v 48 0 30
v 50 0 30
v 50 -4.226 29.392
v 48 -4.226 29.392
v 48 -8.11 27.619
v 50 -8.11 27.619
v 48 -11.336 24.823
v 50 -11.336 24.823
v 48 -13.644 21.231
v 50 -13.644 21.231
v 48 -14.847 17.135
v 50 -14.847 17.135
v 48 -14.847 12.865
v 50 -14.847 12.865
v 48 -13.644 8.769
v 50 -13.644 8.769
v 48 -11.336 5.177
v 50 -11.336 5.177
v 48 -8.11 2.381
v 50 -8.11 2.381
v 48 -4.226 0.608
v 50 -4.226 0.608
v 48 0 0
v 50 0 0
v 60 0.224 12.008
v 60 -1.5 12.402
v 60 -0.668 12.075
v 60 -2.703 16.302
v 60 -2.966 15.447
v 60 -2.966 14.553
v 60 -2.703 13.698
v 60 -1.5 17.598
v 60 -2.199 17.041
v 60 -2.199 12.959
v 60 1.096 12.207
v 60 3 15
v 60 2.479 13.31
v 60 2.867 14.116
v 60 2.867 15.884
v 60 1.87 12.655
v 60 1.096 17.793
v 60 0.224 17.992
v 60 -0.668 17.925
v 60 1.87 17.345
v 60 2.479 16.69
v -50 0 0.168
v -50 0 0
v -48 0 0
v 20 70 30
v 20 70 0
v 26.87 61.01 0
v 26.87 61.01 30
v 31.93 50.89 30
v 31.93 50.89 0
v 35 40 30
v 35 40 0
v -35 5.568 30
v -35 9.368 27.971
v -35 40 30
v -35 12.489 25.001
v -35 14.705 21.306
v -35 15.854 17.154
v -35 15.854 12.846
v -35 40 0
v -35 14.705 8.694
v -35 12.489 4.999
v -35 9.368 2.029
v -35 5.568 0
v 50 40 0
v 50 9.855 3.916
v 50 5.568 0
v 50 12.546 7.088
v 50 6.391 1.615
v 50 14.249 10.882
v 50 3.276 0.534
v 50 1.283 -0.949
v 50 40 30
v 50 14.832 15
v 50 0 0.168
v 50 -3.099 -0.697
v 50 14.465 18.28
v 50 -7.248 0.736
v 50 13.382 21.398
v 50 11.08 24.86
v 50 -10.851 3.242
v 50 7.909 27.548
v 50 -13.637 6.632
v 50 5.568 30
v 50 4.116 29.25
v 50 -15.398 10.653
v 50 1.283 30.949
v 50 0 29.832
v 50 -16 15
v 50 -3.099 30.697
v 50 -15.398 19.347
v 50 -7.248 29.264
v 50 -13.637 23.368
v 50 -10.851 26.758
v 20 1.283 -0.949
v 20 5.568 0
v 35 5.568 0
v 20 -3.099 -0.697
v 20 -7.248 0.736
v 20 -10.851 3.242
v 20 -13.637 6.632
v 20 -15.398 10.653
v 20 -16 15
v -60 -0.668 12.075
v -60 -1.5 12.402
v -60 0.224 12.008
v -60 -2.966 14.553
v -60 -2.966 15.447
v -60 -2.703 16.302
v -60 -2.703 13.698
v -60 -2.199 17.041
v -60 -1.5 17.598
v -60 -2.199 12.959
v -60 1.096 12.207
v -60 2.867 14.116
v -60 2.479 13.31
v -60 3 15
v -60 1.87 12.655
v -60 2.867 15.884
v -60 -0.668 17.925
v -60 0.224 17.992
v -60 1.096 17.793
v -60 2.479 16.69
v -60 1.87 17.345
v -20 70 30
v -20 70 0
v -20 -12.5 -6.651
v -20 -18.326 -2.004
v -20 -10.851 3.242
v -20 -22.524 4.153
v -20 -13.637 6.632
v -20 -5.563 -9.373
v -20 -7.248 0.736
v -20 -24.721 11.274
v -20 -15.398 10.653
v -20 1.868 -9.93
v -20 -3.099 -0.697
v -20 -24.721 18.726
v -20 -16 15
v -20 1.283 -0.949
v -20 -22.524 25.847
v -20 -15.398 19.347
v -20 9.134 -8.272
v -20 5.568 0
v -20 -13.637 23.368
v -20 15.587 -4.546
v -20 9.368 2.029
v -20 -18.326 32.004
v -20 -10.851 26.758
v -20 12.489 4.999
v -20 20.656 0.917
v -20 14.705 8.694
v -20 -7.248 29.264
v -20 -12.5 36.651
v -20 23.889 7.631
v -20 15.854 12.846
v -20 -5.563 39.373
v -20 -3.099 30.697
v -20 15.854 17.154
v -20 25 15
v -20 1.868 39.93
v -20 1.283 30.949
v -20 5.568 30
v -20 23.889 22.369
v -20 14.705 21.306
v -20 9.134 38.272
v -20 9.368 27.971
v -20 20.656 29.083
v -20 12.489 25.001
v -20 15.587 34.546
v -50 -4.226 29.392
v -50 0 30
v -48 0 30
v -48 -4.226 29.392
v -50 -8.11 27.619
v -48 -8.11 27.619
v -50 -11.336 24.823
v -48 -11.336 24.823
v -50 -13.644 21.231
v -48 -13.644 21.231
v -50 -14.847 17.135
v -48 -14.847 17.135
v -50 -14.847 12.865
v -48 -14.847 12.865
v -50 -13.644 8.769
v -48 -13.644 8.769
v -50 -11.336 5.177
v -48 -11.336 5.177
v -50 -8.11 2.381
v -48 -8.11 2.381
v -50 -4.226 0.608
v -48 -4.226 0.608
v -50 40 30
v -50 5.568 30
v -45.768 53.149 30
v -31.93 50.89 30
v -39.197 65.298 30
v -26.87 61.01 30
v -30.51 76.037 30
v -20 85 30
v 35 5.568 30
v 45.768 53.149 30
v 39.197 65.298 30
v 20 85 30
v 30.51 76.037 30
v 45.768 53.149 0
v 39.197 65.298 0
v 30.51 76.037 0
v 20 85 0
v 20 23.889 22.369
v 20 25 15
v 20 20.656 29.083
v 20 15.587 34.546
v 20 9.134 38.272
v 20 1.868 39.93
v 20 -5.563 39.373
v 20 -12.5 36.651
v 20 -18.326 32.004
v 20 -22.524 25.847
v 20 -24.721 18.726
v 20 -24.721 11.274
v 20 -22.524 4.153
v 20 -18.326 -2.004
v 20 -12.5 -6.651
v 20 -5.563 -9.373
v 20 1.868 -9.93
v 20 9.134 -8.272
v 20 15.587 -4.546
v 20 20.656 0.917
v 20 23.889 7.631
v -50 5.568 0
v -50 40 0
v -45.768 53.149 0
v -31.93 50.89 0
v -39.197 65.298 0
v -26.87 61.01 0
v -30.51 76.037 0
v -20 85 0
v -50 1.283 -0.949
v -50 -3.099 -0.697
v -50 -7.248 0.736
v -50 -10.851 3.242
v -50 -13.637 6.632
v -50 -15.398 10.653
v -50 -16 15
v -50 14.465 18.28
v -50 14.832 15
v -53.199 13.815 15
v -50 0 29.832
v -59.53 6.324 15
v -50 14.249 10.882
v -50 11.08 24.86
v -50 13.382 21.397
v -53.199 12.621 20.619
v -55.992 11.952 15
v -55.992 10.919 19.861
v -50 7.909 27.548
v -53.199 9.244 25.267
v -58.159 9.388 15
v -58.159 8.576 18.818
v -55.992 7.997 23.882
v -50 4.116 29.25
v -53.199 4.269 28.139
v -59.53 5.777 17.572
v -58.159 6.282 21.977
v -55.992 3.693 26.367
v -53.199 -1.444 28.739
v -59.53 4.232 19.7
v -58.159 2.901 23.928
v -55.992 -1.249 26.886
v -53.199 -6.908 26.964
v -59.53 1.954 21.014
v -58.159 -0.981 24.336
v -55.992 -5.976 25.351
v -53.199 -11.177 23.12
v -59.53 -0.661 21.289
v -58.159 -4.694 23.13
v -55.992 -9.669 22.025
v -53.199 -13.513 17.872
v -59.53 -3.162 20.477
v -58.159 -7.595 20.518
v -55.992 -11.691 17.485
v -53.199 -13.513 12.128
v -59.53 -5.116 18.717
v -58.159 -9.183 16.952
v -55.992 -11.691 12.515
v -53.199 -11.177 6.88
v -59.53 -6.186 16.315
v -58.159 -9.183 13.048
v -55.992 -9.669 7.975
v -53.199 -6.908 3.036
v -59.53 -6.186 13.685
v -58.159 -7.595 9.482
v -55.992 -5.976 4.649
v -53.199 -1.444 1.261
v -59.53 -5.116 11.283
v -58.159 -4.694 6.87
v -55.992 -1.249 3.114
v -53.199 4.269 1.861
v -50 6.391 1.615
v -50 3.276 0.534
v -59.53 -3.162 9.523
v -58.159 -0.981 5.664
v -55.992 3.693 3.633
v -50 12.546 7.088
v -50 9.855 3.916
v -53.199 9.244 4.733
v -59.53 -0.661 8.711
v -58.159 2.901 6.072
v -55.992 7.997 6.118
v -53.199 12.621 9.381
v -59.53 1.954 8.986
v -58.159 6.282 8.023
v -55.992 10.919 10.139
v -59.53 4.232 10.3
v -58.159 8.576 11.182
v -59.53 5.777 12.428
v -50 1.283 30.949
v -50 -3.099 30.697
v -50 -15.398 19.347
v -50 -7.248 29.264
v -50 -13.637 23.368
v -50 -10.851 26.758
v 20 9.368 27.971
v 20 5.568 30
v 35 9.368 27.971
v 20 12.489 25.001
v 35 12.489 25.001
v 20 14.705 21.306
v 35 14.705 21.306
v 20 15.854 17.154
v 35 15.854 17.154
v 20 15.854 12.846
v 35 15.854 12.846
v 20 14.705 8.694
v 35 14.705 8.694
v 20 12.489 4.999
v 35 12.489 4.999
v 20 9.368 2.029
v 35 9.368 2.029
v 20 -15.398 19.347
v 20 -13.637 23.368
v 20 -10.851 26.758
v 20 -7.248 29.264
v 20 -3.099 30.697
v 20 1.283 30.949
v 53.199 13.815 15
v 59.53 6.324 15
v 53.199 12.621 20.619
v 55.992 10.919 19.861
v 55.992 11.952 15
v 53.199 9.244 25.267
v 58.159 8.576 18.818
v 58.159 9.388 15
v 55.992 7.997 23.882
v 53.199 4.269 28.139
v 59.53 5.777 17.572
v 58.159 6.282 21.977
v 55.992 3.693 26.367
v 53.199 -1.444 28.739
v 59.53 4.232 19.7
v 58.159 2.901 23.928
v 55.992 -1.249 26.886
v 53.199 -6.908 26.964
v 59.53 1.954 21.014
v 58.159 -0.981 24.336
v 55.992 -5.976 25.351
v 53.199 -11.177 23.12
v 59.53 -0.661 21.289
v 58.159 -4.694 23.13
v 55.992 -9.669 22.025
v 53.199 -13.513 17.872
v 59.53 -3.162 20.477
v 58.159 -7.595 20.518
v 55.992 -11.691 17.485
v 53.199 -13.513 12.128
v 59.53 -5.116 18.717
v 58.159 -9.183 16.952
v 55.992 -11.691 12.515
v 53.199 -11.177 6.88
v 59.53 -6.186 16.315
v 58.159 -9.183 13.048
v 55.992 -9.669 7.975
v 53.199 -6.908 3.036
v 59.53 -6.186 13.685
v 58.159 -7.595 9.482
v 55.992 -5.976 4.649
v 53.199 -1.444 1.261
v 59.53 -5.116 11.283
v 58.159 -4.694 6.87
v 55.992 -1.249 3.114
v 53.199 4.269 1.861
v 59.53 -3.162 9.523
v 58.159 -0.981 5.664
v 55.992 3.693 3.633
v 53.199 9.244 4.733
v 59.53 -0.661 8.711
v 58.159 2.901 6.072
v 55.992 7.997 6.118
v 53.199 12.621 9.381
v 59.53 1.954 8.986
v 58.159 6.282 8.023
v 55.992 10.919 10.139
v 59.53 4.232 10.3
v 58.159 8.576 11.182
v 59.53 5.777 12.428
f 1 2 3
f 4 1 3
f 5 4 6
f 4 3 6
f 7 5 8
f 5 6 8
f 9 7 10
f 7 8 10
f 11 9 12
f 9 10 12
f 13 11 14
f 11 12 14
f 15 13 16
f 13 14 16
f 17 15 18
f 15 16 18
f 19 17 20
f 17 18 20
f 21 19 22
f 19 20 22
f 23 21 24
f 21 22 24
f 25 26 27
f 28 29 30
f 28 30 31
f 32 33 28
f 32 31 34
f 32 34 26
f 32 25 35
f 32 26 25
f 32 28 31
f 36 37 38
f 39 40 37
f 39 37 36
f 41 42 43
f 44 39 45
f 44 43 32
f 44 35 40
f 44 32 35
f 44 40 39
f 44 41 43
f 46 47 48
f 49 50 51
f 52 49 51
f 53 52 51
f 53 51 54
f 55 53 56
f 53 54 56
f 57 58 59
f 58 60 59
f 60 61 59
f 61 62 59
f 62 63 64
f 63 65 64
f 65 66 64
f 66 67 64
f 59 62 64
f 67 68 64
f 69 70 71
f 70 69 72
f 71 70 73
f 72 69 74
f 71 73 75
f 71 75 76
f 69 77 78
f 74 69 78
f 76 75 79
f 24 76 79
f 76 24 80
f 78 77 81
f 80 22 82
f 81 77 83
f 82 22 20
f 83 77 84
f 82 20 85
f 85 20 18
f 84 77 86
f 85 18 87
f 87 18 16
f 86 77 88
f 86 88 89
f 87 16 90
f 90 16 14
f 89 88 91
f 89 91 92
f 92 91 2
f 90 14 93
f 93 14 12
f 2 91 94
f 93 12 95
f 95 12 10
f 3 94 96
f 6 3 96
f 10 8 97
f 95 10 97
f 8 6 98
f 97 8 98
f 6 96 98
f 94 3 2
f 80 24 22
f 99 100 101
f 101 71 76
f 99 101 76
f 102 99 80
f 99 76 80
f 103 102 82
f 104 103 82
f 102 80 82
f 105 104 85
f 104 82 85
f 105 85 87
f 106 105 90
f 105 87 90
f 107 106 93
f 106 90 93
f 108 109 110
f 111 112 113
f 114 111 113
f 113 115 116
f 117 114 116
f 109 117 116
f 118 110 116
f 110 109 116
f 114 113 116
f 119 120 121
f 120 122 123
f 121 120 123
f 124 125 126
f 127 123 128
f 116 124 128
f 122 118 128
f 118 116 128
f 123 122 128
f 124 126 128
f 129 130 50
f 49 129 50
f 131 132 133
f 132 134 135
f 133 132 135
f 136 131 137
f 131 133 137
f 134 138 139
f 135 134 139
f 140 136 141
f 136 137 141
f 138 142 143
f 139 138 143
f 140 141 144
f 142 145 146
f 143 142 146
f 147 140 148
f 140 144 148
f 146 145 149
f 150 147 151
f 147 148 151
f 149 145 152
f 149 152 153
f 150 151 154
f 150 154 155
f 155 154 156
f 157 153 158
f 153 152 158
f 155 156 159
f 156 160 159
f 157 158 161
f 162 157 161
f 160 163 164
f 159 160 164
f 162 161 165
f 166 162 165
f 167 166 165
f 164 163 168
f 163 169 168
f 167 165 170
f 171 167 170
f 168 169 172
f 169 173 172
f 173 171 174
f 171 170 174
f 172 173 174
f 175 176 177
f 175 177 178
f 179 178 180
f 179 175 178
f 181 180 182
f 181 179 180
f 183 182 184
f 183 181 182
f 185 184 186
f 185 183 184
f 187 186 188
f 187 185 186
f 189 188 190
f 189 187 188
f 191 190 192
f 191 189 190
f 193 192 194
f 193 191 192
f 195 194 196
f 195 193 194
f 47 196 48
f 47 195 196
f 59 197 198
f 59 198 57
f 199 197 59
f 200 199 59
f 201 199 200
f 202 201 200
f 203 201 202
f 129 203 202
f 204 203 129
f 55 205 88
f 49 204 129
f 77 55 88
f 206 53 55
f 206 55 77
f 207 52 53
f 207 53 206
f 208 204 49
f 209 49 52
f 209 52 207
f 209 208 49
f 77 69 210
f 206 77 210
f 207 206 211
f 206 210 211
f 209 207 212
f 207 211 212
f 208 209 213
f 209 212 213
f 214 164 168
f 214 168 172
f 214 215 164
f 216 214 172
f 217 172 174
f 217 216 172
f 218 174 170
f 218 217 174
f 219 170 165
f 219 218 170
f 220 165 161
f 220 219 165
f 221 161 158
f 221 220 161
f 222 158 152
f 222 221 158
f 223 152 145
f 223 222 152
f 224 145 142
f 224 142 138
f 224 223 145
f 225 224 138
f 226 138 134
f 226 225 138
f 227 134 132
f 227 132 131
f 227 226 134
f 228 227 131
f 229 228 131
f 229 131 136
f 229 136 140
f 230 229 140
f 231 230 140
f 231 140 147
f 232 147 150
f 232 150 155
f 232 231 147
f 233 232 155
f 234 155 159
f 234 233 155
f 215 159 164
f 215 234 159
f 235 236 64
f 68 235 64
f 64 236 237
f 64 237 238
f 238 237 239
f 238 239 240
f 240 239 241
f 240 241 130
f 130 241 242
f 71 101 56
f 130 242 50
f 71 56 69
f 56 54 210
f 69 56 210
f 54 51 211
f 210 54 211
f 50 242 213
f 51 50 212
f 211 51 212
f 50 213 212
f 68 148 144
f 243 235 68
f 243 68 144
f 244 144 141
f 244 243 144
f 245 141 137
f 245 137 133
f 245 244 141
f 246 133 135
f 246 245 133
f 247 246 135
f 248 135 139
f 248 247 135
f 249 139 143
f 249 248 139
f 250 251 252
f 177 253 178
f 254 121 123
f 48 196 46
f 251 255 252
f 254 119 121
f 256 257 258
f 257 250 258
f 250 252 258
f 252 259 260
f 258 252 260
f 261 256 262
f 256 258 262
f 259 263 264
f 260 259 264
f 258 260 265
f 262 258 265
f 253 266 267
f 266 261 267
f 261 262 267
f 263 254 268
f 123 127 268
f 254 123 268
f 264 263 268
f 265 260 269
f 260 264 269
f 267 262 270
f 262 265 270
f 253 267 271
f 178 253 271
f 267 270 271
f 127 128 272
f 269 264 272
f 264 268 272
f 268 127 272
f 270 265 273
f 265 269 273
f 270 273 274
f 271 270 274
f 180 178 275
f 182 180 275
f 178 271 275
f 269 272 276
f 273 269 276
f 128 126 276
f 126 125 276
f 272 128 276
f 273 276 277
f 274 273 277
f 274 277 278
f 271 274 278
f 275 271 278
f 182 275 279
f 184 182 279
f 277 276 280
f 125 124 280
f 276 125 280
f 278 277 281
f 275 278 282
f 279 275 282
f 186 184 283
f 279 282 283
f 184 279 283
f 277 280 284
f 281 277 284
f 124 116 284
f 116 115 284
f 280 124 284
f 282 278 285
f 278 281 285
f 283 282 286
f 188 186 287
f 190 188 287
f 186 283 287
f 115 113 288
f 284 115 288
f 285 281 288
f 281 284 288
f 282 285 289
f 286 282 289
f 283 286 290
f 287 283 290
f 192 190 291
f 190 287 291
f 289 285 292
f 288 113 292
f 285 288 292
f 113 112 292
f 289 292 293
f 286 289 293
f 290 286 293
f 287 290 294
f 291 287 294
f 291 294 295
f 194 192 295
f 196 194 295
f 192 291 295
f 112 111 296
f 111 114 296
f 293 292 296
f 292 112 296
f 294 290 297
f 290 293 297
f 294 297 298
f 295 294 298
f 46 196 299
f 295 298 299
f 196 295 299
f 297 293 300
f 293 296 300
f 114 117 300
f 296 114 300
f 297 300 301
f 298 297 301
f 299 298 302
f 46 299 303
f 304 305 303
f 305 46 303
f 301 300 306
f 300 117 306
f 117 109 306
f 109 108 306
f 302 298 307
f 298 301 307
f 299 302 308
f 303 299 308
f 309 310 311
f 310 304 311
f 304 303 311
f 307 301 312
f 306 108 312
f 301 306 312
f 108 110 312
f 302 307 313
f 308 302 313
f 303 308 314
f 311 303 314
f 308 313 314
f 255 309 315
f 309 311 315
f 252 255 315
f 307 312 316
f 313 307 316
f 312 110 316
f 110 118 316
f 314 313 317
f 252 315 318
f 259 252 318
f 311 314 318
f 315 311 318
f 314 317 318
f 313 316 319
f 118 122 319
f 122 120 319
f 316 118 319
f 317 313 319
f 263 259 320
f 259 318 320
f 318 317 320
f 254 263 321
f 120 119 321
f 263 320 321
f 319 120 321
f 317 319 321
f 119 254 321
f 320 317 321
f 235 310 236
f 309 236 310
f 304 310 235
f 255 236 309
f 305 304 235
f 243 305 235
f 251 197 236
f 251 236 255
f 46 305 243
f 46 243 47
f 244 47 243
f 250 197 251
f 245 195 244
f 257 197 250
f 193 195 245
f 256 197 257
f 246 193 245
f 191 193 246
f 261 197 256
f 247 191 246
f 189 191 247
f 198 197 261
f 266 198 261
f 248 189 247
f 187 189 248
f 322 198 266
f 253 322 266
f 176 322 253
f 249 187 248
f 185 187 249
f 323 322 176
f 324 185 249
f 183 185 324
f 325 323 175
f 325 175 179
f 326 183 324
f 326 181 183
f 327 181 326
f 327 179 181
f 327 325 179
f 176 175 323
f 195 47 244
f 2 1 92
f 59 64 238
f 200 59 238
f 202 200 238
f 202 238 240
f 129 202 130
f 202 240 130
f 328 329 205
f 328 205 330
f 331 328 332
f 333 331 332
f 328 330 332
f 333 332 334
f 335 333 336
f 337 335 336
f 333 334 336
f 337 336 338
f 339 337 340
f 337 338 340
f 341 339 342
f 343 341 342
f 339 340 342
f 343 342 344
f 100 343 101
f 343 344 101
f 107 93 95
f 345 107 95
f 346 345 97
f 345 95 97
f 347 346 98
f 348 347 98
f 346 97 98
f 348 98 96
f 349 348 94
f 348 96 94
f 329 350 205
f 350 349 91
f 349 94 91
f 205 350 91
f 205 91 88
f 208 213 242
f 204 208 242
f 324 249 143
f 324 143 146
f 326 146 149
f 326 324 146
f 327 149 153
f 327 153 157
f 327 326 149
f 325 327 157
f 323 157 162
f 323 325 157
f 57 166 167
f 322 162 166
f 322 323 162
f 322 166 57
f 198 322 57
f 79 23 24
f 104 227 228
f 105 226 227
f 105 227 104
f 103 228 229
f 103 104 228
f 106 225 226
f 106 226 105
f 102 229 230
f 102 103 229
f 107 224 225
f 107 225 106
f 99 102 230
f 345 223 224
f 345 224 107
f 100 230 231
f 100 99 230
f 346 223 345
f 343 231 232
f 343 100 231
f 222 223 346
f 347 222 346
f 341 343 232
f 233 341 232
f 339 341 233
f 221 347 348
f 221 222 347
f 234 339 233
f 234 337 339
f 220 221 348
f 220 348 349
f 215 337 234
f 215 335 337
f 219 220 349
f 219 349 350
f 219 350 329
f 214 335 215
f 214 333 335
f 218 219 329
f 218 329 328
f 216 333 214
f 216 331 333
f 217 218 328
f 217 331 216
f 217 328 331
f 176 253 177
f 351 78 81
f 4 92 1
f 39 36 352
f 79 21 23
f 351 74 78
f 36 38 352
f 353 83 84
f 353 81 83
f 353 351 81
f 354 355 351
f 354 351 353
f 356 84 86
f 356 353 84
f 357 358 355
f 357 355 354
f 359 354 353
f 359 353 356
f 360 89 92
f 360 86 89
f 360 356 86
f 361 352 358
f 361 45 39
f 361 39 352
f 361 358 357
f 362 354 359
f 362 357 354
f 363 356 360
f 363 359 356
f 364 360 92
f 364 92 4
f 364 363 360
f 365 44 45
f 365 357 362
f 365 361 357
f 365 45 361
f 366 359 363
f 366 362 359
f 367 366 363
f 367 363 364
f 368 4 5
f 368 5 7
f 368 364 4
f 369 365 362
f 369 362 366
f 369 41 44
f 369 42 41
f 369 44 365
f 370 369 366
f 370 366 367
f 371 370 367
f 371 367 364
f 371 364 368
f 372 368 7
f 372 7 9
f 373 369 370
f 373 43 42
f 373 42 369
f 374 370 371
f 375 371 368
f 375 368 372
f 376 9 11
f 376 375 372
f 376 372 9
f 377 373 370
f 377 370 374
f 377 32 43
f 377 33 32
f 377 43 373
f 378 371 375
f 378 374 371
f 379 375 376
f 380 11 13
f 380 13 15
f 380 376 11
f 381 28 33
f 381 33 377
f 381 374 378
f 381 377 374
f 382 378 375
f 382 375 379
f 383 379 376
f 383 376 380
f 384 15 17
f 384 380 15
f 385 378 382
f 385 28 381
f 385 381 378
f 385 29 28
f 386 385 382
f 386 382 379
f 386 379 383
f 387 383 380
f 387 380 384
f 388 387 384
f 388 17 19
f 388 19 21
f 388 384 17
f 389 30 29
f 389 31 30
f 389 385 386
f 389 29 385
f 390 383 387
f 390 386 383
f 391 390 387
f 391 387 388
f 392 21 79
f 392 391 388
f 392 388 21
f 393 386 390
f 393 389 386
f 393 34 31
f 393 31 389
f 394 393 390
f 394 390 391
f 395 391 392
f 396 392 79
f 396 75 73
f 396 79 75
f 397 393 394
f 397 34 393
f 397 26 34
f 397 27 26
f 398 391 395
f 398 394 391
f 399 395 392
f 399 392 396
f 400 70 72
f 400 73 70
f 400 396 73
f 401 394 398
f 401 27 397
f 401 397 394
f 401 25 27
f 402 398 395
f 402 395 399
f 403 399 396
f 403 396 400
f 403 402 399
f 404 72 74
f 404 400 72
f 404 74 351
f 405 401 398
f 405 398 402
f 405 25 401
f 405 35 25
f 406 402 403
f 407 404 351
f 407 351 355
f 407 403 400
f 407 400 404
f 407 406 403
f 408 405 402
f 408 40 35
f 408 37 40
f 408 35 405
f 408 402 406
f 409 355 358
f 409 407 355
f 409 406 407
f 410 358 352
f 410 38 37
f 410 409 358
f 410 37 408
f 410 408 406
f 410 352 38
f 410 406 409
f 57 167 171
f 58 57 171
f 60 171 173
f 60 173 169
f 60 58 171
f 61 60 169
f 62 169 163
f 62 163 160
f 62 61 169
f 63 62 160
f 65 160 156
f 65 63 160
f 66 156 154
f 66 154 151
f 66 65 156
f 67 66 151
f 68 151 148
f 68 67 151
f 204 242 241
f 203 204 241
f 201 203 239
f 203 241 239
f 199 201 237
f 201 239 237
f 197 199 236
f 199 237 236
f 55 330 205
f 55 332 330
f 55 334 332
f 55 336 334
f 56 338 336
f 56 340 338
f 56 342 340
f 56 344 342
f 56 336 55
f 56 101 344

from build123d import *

# Parameters (mm, degrees)
F0_W          = 15
F0_H          = 40
F0_W_2        = 20
F0_H_2        = 15
F1_DEPTH      = 30
F2_R          = 25
F2_R_2        = 15
F3_DEPTH      = 20
F3_DEPTH_BACK = 20
F4_DEPTH      = 60
F4_DEPTH_BACK = 60
F5_R          = 12
F7_DEPTH      = 30


with BuildPart() as f1:
    # F0 (on Top) → F1 (new body)
    with BuildSketch(Plane.XY):
        with Locations((-42.5, 20)):
            Rectangle(F0_W, F0_H)
        with BuildLine():
            ThreePointArc((-35, 40), (-29.638939348, 56.069469674), (-20, 70))
            Line((-20, 70), (-20, 85))
            ThreePointArc((-20, 85), (-39.1974084264, 65.2982722843), (-50, 40))
            Line((-50, 40), (-35, 40))
        make_face()
        with Locations((-10, 77.5)):
            Rectangle(F0_W_2, F0_H_2)
        with Locations((10, 77.5)):
            Rectangle(F0_W_2, F0_H_2)
        with BuildLine():
            ThreePointArc((20, 70), (29.638939348, 56.069469674), (35, 40))
            Line((35, 40), (50, 40))
            ThreePointArc((50, 40), (39.1974084264, 65.2982722843), (20, 85))
            Line((20, 85), (20, 70))
        make_face()
        with Locations((42.5, 20)):
            Rectangle(F0_W, F0_H)
    extrude(amount=F1_DEPTH)



with BuildPart() as f3:
    # F2 (on Right) → F3 (new body, two sides)
    with BuildSketch(Plane.YZ) as f3_sk:
        with Locations((0, 15)):
            Circle(F2_R)
        with Locations((0, 15)):
            Circle(F2_R_2, mode=Mode.SUBTRACT)
    extrude(amount=F3_DEPTH)
    extrude(f3_sk.sketch, amount=-F3_DEPTH_BACK)


with BuildPart() as f4:
    # F2 (on Right) → F4 (new body, two sides)
    with BuildSketch(Plane.YZ) as f4_sk:
        with Locations((0, 15)):
            Circle(F2_R_2)
    extrude(amount=F4_DEPTH)
    extrude(f4_sk.sketch, amount=-F4_DEPTH_BACK)

    # F5
    f5_edges = [f4.edges().sort_by_distance(p)[0] for p in [
        (-60, -15, 15),
        (60, -15, 15),
    ]]
    fillet(f5_edges, radius=F5_R)


with BuildPart() as f1_1:
    add(f1.part)

    add(f3.part)  # F7 merges F3

    add(f4.part)  # F7 merges F4
    # F6 (on face) → F7 (join)
    with BuildSketch(Plane(origin=(-50, 0, 0), x_dir=(0, -1, 0), z_dir=(-1, 0, 0))):
        with BuildLine():
            ThreePointArc((0, 0), (-15, 15), (0, 30))
            Line((0, 30), (-5.5677643628, 30))
            ThreePointArc((-5.5677643628, 30), (-16, 15), (-5.5677643628, 0))
            Line((-5.5677643628, 0), (0, 0))
        make_face()
        with BuildLine():
            Line((-5.5677643628, 30), (0, 30))
            ThreePointArc((0, 30), (10.6066017178, 25.6066017178), (15, 15))
            ThreePointArc((15, 15), (10.6066017178, 4.3933982822), (0, 0))
            Line((0, 0), (-5.5677643628, 0))
            ThreePointArc((-5.5677643628, 0), (9.1355287257, 1.8644712743), (16, 15))
            ThreePointArc((16, 15), (9.1355287257, 28.1355287257), (-5.5677643628, 30))
        make_face()
    extrude(amount=-F7_DEPTH)

    # F8: F1 across plane


with BuildPart() as f1_2:
    add(f1_1.part)
    add(f1_1.part.mirror(Plane.YZ))


solid = f1_2.part
